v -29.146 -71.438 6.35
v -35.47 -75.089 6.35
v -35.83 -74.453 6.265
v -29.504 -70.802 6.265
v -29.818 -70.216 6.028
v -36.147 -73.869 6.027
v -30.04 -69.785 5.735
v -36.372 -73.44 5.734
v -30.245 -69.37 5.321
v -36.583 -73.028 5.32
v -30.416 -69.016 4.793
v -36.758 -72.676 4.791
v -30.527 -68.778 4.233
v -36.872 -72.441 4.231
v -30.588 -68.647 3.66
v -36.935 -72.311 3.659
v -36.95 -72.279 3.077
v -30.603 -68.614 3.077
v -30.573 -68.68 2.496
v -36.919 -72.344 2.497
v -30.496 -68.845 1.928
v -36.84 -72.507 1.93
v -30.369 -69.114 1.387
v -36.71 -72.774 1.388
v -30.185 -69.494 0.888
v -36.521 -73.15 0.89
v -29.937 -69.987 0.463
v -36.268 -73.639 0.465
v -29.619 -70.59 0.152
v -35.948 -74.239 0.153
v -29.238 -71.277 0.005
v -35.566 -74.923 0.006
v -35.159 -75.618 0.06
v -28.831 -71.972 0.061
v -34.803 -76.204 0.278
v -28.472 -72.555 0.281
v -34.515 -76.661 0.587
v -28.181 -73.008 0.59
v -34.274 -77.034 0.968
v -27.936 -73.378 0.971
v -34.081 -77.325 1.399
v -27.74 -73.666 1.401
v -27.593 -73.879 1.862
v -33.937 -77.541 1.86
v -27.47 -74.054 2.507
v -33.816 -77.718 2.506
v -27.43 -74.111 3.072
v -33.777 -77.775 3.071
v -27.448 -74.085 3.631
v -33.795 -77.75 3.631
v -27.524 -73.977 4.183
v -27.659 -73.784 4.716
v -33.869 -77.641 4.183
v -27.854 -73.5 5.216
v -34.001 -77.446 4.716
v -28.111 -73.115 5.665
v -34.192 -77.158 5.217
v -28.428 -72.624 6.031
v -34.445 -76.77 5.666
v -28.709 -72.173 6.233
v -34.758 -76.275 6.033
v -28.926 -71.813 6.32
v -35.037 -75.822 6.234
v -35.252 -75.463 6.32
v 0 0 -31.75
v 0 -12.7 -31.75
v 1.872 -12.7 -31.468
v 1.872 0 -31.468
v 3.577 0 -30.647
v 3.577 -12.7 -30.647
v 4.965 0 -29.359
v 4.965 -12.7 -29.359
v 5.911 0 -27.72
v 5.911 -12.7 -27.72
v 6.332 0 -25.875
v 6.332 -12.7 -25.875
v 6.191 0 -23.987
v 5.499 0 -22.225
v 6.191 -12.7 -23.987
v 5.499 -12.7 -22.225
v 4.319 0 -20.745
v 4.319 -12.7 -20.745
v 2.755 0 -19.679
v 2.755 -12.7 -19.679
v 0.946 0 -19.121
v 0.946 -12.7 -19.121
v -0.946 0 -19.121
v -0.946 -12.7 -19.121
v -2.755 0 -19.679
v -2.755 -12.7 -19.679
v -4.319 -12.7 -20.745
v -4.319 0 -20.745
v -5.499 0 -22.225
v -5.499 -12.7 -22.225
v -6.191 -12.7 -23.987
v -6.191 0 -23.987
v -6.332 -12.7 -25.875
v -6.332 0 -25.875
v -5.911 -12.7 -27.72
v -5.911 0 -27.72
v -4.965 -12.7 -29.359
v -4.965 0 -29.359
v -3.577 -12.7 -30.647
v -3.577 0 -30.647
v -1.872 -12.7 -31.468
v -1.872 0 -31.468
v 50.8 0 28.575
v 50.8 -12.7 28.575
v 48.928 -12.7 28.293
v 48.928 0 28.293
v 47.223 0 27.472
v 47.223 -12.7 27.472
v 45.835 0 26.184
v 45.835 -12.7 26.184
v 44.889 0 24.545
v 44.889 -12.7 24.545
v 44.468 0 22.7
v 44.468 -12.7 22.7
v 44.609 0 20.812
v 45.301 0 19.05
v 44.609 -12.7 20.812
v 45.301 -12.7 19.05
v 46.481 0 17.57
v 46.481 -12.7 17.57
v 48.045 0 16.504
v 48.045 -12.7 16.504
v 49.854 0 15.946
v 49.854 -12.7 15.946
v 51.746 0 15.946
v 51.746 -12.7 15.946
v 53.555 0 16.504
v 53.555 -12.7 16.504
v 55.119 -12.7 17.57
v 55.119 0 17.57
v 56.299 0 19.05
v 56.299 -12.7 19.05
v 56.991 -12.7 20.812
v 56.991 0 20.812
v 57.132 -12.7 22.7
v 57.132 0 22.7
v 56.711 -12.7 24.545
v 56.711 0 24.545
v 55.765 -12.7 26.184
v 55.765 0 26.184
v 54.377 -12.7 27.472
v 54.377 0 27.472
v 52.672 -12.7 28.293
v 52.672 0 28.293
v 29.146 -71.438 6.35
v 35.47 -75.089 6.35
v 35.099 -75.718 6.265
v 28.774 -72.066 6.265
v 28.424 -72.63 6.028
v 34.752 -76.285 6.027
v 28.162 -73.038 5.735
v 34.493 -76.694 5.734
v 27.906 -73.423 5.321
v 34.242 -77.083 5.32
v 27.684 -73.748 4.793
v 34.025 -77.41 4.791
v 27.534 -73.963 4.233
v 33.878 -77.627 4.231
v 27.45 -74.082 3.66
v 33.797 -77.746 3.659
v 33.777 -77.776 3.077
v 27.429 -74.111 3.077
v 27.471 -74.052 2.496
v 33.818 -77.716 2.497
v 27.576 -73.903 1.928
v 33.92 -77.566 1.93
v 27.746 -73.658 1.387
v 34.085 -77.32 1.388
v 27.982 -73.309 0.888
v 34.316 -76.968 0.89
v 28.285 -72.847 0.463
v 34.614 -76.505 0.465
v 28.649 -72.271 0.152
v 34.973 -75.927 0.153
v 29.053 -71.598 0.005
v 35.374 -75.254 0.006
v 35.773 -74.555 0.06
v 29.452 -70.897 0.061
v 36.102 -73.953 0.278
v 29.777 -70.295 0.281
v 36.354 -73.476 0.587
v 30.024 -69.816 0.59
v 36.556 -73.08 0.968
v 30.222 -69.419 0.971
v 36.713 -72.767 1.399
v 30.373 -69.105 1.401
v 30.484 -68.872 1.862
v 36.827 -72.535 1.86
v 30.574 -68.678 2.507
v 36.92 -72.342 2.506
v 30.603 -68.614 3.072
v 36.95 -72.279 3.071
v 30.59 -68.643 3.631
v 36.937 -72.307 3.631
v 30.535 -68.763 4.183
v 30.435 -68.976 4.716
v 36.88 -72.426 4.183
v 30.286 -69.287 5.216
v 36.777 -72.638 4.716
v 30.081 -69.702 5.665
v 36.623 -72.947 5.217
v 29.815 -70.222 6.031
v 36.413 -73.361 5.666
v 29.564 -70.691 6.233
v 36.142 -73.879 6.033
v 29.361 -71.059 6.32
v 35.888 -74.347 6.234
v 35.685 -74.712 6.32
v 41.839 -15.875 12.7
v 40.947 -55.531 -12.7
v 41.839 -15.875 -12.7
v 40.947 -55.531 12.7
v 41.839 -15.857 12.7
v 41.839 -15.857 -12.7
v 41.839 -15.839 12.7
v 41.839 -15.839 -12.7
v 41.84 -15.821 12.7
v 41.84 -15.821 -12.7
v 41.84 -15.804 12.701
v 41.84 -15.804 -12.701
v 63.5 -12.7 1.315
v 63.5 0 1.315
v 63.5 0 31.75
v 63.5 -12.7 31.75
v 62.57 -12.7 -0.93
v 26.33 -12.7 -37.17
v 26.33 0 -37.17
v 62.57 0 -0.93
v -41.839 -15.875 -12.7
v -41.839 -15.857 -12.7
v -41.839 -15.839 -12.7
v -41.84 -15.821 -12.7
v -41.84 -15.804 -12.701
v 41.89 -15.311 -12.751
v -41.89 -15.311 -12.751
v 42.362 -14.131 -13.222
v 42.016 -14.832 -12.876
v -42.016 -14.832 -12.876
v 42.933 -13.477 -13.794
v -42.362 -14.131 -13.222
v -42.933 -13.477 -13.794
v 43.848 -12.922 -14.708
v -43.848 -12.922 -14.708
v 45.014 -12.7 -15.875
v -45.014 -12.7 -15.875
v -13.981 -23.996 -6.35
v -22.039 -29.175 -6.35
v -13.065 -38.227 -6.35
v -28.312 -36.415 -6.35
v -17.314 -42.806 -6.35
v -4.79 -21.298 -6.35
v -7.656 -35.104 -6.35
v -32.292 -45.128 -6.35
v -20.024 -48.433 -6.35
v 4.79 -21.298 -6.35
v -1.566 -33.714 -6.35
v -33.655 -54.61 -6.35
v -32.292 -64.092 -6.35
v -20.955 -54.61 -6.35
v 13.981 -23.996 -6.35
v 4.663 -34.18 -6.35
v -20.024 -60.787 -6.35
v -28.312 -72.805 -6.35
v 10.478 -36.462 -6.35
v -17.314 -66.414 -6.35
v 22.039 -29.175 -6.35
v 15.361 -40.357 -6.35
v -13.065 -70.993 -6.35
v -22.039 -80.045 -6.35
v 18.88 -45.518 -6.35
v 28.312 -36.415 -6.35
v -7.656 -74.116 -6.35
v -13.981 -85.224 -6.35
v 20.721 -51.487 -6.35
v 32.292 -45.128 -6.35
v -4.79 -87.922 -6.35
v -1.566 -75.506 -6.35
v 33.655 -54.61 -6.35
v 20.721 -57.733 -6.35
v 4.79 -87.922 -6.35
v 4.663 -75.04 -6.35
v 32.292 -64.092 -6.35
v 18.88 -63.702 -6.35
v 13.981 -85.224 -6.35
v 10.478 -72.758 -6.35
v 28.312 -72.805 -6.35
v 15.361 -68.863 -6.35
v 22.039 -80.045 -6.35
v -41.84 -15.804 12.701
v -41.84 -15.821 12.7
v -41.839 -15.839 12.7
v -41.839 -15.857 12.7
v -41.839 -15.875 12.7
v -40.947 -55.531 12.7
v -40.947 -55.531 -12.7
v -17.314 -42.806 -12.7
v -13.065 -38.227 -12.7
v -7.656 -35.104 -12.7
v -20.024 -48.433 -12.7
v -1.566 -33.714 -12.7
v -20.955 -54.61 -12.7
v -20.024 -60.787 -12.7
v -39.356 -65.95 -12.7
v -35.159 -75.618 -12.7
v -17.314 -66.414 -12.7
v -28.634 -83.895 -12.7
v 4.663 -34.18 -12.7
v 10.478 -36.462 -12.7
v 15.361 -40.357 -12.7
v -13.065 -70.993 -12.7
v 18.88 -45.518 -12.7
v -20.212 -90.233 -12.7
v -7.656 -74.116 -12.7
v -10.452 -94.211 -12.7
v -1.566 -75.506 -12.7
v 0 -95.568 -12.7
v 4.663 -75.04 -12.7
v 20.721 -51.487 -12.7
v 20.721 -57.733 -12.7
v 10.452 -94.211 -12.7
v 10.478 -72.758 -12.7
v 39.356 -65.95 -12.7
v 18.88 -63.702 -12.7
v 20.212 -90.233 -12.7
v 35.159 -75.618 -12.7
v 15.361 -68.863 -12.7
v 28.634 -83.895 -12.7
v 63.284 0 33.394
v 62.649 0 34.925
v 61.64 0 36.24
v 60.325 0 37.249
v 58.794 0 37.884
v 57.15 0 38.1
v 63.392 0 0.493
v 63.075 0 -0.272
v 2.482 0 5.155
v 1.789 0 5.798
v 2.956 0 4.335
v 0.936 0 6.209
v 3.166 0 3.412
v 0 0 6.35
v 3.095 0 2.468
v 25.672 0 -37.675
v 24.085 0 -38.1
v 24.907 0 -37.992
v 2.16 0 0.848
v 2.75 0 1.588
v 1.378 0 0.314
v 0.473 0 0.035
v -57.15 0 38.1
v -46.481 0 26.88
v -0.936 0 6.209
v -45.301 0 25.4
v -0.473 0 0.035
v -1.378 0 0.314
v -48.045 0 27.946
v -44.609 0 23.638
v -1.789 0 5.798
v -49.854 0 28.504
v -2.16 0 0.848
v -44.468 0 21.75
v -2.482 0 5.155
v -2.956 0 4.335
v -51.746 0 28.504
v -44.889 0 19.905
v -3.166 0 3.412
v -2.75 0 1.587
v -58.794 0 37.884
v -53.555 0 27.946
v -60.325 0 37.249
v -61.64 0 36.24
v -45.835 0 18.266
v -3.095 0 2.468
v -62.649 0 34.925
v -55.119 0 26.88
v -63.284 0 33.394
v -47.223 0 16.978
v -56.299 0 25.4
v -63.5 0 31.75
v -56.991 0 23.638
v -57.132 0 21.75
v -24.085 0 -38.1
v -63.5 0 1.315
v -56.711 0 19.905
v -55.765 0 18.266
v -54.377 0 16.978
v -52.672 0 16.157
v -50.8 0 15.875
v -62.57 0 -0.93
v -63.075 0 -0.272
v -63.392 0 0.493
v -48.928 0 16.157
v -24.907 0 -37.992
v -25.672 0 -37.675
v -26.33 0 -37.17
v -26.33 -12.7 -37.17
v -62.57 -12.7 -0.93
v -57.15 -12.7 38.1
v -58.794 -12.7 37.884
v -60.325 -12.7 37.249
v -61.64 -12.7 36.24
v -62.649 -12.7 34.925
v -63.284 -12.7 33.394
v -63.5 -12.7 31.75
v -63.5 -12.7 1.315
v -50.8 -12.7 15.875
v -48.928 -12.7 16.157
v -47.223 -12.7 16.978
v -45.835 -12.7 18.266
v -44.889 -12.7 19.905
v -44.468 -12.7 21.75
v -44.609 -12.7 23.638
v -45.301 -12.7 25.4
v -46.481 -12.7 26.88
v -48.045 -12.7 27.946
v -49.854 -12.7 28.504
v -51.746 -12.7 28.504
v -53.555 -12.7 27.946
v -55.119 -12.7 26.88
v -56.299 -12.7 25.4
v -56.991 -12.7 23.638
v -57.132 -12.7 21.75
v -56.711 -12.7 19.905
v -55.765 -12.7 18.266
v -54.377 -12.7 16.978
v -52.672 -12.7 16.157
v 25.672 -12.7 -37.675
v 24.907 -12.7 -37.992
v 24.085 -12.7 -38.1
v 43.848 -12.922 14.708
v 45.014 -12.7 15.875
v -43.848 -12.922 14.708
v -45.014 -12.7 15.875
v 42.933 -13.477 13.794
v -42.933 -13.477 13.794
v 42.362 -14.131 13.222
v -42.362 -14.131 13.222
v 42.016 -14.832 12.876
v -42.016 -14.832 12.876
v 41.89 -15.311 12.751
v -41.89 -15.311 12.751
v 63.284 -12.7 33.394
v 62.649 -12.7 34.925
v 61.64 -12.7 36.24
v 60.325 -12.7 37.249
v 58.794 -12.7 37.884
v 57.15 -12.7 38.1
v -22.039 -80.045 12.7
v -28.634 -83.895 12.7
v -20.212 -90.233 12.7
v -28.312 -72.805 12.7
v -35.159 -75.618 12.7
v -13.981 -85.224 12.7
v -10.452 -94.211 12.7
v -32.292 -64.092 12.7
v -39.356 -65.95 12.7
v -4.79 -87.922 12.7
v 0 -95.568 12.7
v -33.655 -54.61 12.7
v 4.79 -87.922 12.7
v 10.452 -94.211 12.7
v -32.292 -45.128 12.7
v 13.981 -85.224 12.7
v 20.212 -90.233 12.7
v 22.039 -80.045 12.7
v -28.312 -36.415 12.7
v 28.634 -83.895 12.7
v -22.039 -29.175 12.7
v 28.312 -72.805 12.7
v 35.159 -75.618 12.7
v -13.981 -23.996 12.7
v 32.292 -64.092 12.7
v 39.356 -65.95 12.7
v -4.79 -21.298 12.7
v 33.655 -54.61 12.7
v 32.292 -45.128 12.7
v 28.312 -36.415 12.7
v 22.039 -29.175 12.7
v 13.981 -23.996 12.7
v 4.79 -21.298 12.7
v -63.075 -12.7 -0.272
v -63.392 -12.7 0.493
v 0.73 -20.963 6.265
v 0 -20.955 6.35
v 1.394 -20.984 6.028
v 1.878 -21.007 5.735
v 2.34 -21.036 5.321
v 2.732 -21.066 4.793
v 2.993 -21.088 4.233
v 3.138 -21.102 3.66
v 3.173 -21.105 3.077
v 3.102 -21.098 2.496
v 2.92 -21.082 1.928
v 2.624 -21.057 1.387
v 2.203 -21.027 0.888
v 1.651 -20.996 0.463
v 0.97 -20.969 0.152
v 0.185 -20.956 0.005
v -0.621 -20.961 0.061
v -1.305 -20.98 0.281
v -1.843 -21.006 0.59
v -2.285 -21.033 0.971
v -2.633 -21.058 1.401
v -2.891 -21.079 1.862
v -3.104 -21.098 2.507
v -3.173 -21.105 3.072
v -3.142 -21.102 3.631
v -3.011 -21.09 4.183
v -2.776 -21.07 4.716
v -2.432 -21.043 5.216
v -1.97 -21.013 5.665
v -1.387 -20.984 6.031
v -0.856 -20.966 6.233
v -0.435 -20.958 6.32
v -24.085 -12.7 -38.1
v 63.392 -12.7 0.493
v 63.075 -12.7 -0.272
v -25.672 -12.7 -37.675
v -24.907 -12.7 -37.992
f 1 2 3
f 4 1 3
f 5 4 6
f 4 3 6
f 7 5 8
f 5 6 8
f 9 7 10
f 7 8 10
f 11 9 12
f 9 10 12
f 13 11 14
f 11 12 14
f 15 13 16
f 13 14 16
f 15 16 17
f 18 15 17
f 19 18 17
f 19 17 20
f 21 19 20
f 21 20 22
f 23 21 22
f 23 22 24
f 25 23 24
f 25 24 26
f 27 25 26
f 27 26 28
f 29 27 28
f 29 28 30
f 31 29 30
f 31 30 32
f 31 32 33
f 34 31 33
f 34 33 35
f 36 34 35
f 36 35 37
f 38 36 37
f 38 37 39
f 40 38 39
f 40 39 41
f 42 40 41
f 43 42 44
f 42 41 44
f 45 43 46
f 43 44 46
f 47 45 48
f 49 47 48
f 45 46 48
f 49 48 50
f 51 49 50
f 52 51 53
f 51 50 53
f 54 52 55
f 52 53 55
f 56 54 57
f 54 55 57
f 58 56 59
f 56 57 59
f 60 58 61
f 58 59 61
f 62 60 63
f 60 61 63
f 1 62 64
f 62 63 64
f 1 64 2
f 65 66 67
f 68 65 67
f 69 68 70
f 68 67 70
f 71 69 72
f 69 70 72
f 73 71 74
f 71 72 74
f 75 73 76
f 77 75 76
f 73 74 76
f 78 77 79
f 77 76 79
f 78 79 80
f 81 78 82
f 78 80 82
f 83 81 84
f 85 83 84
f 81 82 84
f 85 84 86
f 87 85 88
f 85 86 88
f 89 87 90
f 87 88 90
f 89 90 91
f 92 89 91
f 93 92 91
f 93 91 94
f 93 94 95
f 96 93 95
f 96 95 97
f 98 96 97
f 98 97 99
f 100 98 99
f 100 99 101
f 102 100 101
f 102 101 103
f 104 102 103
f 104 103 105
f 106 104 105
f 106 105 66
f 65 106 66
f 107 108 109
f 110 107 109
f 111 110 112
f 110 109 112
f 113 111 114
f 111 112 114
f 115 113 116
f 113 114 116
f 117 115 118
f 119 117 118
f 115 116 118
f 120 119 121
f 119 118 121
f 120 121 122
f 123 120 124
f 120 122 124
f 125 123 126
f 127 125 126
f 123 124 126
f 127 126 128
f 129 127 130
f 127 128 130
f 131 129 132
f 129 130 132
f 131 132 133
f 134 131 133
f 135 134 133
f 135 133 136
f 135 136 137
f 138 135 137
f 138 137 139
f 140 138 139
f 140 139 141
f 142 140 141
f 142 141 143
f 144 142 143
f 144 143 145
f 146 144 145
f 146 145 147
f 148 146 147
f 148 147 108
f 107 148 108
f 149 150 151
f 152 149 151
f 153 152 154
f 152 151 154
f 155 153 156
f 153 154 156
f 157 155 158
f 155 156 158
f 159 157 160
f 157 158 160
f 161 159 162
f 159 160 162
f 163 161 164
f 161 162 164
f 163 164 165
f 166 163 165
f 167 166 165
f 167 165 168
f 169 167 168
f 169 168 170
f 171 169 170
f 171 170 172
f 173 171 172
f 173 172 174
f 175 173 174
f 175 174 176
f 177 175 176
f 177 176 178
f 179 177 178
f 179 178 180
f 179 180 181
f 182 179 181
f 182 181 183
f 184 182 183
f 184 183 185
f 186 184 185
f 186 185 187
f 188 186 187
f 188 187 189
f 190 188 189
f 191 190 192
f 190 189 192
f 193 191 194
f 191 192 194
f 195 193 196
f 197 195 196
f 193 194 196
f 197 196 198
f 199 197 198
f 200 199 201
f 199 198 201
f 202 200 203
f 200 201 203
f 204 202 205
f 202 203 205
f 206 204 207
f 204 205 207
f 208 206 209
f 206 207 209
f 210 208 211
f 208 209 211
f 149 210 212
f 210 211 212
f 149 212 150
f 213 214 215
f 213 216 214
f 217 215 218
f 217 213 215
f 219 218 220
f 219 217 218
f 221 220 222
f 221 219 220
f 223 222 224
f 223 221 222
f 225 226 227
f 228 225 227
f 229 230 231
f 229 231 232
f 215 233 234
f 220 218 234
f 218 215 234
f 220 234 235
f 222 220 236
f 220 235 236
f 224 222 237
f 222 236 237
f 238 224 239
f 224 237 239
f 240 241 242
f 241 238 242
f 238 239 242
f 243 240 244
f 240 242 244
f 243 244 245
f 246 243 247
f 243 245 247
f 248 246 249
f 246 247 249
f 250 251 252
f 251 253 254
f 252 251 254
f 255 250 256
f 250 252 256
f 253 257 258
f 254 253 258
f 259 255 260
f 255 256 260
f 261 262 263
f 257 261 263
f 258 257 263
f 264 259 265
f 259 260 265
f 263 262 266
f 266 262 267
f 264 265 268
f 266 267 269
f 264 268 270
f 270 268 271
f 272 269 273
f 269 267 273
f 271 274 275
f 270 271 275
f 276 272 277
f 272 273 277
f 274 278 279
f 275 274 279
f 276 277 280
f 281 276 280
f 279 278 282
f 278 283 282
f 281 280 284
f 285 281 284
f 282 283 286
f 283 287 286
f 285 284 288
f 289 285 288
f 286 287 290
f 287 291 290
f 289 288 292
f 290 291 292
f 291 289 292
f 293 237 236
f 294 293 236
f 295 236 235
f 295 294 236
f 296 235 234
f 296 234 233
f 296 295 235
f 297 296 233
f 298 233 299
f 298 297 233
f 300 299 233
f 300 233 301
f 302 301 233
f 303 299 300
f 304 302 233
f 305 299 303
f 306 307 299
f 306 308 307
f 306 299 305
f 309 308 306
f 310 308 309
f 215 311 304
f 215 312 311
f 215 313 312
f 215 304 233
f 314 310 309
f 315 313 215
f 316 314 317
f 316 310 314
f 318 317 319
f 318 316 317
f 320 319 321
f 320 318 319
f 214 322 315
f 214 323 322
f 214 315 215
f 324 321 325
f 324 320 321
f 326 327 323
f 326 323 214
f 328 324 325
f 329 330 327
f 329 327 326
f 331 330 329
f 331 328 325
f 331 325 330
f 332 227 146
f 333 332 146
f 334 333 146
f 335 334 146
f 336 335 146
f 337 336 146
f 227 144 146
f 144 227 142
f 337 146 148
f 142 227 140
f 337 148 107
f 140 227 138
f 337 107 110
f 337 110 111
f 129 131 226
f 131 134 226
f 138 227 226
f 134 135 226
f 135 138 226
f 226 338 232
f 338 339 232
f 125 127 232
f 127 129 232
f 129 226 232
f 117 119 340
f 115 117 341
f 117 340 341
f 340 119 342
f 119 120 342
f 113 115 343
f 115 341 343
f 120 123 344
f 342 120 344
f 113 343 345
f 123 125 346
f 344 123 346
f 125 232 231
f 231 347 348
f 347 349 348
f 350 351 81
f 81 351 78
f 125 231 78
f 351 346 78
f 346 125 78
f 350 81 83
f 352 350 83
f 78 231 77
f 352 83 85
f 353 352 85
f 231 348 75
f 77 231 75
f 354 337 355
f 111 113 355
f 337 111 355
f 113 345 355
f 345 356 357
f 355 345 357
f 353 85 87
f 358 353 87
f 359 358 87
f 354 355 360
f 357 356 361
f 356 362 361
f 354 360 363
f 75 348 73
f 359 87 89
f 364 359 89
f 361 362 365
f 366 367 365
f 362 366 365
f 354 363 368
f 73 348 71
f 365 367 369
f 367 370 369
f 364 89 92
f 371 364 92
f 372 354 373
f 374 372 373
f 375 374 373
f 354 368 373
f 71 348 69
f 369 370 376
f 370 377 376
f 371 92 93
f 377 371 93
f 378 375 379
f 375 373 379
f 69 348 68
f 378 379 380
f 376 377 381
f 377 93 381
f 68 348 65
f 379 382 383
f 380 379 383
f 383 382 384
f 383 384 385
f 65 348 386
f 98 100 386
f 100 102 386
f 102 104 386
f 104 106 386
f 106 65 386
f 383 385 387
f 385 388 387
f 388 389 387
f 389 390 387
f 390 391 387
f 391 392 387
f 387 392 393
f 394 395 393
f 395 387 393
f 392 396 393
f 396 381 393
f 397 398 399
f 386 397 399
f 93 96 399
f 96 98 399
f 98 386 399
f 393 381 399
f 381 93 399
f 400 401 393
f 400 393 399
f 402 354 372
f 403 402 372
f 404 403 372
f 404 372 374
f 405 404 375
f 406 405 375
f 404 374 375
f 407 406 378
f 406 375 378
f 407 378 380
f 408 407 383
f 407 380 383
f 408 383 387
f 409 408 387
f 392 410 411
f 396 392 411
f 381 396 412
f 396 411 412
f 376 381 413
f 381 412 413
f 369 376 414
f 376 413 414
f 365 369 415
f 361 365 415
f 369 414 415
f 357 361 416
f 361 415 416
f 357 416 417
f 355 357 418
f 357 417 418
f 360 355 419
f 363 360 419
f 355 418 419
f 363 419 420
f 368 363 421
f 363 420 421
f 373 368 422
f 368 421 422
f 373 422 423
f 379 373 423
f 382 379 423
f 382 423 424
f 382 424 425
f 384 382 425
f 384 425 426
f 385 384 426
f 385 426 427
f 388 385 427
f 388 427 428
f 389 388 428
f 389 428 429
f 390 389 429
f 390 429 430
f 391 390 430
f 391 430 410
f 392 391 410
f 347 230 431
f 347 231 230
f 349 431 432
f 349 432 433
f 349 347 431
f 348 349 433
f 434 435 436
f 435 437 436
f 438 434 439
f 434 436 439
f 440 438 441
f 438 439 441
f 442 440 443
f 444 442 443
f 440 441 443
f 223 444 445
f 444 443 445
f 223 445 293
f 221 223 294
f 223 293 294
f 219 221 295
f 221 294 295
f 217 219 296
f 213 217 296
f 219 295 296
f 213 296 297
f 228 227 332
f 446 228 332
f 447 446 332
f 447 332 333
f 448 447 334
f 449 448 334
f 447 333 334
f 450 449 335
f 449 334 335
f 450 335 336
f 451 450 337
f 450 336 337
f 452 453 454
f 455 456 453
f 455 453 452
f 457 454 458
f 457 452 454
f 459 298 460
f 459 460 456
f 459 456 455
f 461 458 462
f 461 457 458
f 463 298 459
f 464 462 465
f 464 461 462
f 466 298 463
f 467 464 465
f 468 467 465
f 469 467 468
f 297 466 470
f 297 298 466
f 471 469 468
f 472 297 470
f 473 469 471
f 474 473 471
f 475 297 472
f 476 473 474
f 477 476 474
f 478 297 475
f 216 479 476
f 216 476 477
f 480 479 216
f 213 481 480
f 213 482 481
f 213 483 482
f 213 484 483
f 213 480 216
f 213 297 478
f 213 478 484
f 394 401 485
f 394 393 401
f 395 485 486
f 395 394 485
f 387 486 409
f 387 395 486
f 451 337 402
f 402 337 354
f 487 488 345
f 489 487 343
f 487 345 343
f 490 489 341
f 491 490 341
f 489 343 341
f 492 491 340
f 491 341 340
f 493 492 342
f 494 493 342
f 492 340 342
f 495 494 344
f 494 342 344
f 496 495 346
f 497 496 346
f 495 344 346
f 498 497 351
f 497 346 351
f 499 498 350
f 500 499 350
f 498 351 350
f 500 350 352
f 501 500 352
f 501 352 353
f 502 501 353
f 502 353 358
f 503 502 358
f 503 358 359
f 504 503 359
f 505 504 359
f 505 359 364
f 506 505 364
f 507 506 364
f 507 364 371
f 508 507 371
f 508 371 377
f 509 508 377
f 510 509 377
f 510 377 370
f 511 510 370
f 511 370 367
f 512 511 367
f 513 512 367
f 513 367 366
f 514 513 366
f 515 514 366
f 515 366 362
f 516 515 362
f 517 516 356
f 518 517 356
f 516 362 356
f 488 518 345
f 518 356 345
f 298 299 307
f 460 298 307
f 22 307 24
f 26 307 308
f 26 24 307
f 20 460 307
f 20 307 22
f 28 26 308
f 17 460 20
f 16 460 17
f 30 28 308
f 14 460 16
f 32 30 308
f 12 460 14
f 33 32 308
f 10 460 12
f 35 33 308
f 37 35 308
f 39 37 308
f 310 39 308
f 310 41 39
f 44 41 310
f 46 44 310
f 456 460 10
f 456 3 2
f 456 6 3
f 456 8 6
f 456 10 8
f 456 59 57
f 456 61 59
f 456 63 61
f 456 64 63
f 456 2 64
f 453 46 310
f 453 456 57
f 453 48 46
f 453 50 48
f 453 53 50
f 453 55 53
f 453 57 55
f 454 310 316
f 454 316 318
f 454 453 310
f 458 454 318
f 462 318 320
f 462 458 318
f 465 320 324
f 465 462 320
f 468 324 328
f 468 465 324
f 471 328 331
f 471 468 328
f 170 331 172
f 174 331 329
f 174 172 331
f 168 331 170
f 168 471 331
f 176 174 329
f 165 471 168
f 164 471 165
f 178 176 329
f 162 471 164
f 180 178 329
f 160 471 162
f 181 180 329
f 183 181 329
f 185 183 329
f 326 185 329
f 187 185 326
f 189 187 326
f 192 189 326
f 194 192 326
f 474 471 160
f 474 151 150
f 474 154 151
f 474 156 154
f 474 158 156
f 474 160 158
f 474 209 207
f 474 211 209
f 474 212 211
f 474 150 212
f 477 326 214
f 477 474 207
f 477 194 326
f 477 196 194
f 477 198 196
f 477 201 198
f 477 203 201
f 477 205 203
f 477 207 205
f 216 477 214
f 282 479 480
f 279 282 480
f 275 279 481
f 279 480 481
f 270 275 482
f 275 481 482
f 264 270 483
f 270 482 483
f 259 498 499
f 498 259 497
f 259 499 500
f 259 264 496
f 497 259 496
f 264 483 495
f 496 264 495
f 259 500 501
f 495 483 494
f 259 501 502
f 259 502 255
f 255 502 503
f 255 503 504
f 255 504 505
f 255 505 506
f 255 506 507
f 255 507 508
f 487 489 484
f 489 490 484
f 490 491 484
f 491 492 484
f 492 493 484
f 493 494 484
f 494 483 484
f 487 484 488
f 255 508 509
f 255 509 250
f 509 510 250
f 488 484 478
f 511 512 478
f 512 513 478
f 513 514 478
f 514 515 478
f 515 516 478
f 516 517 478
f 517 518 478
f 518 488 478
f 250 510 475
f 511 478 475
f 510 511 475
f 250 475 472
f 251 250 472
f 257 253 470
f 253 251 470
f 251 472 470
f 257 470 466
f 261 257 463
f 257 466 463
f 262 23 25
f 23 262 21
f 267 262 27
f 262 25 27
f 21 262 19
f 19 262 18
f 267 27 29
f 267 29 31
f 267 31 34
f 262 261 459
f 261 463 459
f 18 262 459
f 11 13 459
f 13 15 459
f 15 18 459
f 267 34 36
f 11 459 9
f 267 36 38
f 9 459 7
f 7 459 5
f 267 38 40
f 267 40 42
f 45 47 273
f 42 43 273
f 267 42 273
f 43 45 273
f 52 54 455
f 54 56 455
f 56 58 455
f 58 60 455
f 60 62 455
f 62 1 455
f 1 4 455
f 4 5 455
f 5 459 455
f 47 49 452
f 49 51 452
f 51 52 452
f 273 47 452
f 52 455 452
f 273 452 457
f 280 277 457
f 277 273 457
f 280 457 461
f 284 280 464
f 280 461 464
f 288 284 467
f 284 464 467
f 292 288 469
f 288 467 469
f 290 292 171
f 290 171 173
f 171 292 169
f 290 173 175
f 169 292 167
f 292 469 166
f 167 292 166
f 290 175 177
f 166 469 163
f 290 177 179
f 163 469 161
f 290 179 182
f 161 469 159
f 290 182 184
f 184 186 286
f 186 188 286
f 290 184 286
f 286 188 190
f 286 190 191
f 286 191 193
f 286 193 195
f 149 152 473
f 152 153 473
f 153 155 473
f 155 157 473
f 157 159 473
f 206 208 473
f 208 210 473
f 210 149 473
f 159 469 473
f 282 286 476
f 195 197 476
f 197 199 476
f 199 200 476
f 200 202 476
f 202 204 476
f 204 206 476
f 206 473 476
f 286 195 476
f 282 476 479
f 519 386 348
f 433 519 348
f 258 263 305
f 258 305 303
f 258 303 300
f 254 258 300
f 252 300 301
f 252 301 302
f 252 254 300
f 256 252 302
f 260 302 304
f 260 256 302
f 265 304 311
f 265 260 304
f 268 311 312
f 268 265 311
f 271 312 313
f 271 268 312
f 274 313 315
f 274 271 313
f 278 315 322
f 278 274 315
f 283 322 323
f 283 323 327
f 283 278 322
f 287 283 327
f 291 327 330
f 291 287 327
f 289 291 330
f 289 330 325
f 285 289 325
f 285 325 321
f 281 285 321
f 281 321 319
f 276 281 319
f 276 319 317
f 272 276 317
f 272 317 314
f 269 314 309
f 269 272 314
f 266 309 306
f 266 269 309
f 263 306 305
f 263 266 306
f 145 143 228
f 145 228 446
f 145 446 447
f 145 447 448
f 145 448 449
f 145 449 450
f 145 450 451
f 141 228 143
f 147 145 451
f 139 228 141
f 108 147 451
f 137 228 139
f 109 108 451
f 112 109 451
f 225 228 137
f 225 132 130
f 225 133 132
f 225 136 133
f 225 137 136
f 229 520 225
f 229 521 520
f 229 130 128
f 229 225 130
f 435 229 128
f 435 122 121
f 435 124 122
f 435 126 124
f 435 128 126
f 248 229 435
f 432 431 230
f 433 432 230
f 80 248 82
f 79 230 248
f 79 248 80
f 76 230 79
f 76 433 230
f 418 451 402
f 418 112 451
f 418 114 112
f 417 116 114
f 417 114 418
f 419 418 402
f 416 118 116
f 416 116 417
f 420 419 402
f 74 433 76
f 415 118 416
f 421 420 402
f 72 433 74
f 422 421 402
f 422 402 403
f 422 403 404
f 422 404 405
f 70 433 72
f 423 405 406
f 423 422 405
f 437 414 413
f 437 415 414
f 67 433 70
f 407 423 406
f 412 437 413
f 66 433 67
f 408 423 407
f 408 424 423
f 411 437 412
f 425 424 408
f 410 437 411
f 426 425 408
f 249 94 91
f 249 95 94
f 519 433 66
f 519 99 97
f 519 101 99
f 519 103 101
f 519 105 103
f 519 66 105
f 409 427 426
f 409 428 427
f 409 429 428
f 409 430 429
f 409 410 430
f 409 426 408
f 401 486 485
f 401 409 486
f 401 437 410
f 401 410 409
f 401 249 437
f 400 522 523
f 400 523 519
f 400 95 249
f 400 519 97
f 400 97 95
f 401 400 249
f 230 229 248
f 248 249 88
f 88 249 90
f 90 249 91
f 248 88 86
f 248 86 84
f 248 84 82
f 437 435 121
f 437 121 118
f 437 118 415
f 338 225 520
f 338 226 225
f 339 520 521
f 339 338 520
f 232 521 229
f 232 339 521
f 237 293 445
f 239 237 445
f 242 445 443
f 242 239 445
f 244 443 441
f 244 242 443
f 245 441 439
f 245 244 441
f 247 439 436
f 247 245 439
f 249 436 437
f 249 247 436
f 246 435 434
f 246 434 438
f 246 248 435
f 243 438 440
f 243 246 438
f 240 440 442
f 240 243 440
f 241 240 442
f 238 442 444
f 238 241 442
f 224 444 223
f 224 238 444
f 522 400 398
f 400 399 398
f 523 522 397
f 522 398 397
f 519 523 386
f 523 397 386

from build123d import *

# Parameters (mm, degrees)
BOSS_EXTRUDE1_DEPTH     = 12.7
SKETCH3_R               = 6.35
CUT_EXTRUDE1_DEPTH      = 76.134213245
BOSS_EXTRUDE2_DEPTH     = 12.7
SKETCH5_R               = 33.655
CUT_EXTRUDE2_DEPTH      = 126.483214241
BOSS_EXTRUDE3_START     = -6.35
SKETCH6_R               = 33.655
SKETCH6_R_2             = 20.955
BOSS_EXTRUDE3_DEPTH     = 6.35
CUT_EXTRUDE3_REACH      = 122.901
CUT_EXTRUDE3_END_RADIUS = 33.655
SKETCH7_R               = 3.175
CIRPATTERN1_COUNT       = 3
CUT_EXTRUDE4_DEPTH      = 112.134524666
FILLET1_R               = 3.175


with BuildPart() as part:
    # Sketch1 → Boss-Extrude1 (new body)
    with BuildSketch(Plane(origin=(0, 0, 0), x_dir=(1, 0, 0), z_dir=(0, 1, 0))):
        with BuildLine():
            Line((-57.15, 38.1), (57.15, 38.1))
            ThreePointArc((57.15, 38.1), (61.640128061, 36.240128061), (63.5, 31.75))
            Line((63.5, 31.75), (63.5, -31.75))
            ThreePointArc((63.5, -31.75), (61.640128061, -36.240128061), (57.15, -38.1))
            Line((57.15, -38.1), (-57.15, -38.1))
            ThreePointArc((-57.15, -38.1), (-61.640128061, -36.240128061), (-63.5, -31.75))
            Line((-63.5, -31.75), (-63.5, 31.75))
            ThreePointArc((-63.5, 31.75), (-61.640128061, 36.240128061), (-57.15, 38.1))
        make_face()
    extrude(amount=-BOSS_EXTRUDE1_DEPTH)

    # Sketch3 → Cut-Extrude1 (cut, through all)
    with BuildSketch(Plane.XZ.offset(12.7)):
        with Locations(Location((-50.8, 22.225, 0), (0, 0, 270))):
            Circle(SKETCH3_R)
        with Locations(Location((50.8, 22.225, 0), (0, 0, 90))):
            Circle(SKETCH3_R)
        with Locations(Location((0, -25.4, 0), (0, 0, 270))):
            Circle(SKETCH3_R)
    extrude(amount=-CUT_EXTRUDE1_DEPTH, mode=Mode.SUBTRACT)

    # Sketch2 → Boss-Extrude2 (add, symmetric)
    with BuildSketch(Plane.XY):
        with BuildLine():
            Line((-41.91, -12.7), (-40.947154642, -55.530506915))
            ThreePointArc((-40.947154642, -55.530506915), (0, -95.5675), (40.947154642, -55.530506915))
            Line((40.947154642, -55.530506915), (41.91, -12.7))
            Line((41.91, -12.7), (-41.91, -12.7))
        make_face()
    extrude(amount=BOSS_EXTRUDE2_DEPTH, both=True)

    # Sketch5 → Cut-Extrude2 (cut, through all)
    with BuildSketch(Plane.XY.offset(12.7)):
        with Locations((0, -54.61)):
            Circle(SKETCH5_R)
    extrude(amount=-CUT_EXTRUDE2_DEPTH, mode=Mode.SUBTRACT)

    # Sketch6 → Boss-Extrude3 (add)
    with BuildSketch(Plane(origin=(0, 0, -12.7), x_dir=(-1, 0, 0), z_dir=(0, 0, -1)).offset(BOSS_EXTRUDE3_START)):
        with Locations(Location((0, -54.61, 0), (0, 0, 180))):
            Circle(SKETCH6_R)
        with Locations((0, -54.61)):
            Circle(SKETCH6_R_2, mode=Mode.SUBTRACT)
    extrude(amount=BOSS_EXTRUDE3_DEPTH)

    # Cut-Extrude3: up to this cylinder (the profile starts outside it)
    cut_extrude3_end = Plane(origin=(0, -54.61, 3.175), z_dir=(0, 0, 1)) * Cylinder(CUT_EXTRUDE3_END_RADIUS, 314.112, mode=Mode.PRIVATE)
    # Sketch7 → Cut-Extrude3 (cut, up to the surface)
    with BuildSketch(Plane(origin=(0, 0, 0), x_dir=(1, 0, 0), z_dir=(0, 1, 0)), mode=Mode.PRIVATE) as cut_extrude3_sk1:
        with Locations(Location((0, -3.175, 0), (0, 0, 270))):
            Circle(SKETCH7_R)
    cut_extrude3_tool1 = extrude(cut_extrude3_sk1.sketch, amount=-CUT_EXTRUDE3_REACH, mode=Mode.PRIVATE) - cut_extrude3_end
    cut_extrude3 = cut_extrude3_tool1.solids().sort_by_distance((0, 0, 3.175))[0]
    add(cut_extrude3, mode=Mode.SUBTRACT)

    # CirPattern1: Cut-Extrude3 ×3 about axis
    cirpattern1_axis = Axis((0, -54.61, 12.7), (0, 0, 1))
    for i in range(1, CIRPATTERN1_COUNT):
        add(cut_extrude3.rotate(cirpattern1_axis, i * 360 / CIRPATTERN1_COUNT), mode=Mode.SUBTRACT)

    # Sketch8 → Cut-Extrude4 (cut, through all)
    with BuildSketch(Plane.XZ.offset(12.7)):
        with BuildLine():
            Line((-63.5, 0), (-25.4, -38.1))
            Line((-25.4, -38.1), (-57.15, -38.1))
            ThreePointArc((-57.15, -38.1), (-61.640128061, -36.240128061), (-63.5, -31.75))
            Line((-63.5, -31.75), (-63.5, 0))
        make_face()
        with BuildLine():
            Line((57.15, -38.1), (25.4, -38.1))
            Line((25.4, -38.1), (63.5, 0))
            Line((63.5, 0), (63.5, -31.75))
            ThreePointArc((63.5, -31.75), (61.640128061, -36.240128061), (57.15, -38.1))
        make_face()
    extrude(amount=-CUT_EXTRUDE4_DEPTH, mode=Mode.SUBTRACT)

    # Fillet1
    fillet1_edges = [part.edges().sort_by_distance(p)[0] for p in [
        (0, -12.7, -12.7),
        (41.91, -12.7, 0),
        (-41.91, -12.7, 0),
        (0, -12.7, 12.7),
        (-63.5, -6.35, 0),
        (-25.4, -6.35, -38.1),
        (25.4, -6.35, -38.1),
        (63.5, -6.35, 0),
    ]]
    fillet(fillet1_edges, radius=FILLET1_R)


solid = part.part
